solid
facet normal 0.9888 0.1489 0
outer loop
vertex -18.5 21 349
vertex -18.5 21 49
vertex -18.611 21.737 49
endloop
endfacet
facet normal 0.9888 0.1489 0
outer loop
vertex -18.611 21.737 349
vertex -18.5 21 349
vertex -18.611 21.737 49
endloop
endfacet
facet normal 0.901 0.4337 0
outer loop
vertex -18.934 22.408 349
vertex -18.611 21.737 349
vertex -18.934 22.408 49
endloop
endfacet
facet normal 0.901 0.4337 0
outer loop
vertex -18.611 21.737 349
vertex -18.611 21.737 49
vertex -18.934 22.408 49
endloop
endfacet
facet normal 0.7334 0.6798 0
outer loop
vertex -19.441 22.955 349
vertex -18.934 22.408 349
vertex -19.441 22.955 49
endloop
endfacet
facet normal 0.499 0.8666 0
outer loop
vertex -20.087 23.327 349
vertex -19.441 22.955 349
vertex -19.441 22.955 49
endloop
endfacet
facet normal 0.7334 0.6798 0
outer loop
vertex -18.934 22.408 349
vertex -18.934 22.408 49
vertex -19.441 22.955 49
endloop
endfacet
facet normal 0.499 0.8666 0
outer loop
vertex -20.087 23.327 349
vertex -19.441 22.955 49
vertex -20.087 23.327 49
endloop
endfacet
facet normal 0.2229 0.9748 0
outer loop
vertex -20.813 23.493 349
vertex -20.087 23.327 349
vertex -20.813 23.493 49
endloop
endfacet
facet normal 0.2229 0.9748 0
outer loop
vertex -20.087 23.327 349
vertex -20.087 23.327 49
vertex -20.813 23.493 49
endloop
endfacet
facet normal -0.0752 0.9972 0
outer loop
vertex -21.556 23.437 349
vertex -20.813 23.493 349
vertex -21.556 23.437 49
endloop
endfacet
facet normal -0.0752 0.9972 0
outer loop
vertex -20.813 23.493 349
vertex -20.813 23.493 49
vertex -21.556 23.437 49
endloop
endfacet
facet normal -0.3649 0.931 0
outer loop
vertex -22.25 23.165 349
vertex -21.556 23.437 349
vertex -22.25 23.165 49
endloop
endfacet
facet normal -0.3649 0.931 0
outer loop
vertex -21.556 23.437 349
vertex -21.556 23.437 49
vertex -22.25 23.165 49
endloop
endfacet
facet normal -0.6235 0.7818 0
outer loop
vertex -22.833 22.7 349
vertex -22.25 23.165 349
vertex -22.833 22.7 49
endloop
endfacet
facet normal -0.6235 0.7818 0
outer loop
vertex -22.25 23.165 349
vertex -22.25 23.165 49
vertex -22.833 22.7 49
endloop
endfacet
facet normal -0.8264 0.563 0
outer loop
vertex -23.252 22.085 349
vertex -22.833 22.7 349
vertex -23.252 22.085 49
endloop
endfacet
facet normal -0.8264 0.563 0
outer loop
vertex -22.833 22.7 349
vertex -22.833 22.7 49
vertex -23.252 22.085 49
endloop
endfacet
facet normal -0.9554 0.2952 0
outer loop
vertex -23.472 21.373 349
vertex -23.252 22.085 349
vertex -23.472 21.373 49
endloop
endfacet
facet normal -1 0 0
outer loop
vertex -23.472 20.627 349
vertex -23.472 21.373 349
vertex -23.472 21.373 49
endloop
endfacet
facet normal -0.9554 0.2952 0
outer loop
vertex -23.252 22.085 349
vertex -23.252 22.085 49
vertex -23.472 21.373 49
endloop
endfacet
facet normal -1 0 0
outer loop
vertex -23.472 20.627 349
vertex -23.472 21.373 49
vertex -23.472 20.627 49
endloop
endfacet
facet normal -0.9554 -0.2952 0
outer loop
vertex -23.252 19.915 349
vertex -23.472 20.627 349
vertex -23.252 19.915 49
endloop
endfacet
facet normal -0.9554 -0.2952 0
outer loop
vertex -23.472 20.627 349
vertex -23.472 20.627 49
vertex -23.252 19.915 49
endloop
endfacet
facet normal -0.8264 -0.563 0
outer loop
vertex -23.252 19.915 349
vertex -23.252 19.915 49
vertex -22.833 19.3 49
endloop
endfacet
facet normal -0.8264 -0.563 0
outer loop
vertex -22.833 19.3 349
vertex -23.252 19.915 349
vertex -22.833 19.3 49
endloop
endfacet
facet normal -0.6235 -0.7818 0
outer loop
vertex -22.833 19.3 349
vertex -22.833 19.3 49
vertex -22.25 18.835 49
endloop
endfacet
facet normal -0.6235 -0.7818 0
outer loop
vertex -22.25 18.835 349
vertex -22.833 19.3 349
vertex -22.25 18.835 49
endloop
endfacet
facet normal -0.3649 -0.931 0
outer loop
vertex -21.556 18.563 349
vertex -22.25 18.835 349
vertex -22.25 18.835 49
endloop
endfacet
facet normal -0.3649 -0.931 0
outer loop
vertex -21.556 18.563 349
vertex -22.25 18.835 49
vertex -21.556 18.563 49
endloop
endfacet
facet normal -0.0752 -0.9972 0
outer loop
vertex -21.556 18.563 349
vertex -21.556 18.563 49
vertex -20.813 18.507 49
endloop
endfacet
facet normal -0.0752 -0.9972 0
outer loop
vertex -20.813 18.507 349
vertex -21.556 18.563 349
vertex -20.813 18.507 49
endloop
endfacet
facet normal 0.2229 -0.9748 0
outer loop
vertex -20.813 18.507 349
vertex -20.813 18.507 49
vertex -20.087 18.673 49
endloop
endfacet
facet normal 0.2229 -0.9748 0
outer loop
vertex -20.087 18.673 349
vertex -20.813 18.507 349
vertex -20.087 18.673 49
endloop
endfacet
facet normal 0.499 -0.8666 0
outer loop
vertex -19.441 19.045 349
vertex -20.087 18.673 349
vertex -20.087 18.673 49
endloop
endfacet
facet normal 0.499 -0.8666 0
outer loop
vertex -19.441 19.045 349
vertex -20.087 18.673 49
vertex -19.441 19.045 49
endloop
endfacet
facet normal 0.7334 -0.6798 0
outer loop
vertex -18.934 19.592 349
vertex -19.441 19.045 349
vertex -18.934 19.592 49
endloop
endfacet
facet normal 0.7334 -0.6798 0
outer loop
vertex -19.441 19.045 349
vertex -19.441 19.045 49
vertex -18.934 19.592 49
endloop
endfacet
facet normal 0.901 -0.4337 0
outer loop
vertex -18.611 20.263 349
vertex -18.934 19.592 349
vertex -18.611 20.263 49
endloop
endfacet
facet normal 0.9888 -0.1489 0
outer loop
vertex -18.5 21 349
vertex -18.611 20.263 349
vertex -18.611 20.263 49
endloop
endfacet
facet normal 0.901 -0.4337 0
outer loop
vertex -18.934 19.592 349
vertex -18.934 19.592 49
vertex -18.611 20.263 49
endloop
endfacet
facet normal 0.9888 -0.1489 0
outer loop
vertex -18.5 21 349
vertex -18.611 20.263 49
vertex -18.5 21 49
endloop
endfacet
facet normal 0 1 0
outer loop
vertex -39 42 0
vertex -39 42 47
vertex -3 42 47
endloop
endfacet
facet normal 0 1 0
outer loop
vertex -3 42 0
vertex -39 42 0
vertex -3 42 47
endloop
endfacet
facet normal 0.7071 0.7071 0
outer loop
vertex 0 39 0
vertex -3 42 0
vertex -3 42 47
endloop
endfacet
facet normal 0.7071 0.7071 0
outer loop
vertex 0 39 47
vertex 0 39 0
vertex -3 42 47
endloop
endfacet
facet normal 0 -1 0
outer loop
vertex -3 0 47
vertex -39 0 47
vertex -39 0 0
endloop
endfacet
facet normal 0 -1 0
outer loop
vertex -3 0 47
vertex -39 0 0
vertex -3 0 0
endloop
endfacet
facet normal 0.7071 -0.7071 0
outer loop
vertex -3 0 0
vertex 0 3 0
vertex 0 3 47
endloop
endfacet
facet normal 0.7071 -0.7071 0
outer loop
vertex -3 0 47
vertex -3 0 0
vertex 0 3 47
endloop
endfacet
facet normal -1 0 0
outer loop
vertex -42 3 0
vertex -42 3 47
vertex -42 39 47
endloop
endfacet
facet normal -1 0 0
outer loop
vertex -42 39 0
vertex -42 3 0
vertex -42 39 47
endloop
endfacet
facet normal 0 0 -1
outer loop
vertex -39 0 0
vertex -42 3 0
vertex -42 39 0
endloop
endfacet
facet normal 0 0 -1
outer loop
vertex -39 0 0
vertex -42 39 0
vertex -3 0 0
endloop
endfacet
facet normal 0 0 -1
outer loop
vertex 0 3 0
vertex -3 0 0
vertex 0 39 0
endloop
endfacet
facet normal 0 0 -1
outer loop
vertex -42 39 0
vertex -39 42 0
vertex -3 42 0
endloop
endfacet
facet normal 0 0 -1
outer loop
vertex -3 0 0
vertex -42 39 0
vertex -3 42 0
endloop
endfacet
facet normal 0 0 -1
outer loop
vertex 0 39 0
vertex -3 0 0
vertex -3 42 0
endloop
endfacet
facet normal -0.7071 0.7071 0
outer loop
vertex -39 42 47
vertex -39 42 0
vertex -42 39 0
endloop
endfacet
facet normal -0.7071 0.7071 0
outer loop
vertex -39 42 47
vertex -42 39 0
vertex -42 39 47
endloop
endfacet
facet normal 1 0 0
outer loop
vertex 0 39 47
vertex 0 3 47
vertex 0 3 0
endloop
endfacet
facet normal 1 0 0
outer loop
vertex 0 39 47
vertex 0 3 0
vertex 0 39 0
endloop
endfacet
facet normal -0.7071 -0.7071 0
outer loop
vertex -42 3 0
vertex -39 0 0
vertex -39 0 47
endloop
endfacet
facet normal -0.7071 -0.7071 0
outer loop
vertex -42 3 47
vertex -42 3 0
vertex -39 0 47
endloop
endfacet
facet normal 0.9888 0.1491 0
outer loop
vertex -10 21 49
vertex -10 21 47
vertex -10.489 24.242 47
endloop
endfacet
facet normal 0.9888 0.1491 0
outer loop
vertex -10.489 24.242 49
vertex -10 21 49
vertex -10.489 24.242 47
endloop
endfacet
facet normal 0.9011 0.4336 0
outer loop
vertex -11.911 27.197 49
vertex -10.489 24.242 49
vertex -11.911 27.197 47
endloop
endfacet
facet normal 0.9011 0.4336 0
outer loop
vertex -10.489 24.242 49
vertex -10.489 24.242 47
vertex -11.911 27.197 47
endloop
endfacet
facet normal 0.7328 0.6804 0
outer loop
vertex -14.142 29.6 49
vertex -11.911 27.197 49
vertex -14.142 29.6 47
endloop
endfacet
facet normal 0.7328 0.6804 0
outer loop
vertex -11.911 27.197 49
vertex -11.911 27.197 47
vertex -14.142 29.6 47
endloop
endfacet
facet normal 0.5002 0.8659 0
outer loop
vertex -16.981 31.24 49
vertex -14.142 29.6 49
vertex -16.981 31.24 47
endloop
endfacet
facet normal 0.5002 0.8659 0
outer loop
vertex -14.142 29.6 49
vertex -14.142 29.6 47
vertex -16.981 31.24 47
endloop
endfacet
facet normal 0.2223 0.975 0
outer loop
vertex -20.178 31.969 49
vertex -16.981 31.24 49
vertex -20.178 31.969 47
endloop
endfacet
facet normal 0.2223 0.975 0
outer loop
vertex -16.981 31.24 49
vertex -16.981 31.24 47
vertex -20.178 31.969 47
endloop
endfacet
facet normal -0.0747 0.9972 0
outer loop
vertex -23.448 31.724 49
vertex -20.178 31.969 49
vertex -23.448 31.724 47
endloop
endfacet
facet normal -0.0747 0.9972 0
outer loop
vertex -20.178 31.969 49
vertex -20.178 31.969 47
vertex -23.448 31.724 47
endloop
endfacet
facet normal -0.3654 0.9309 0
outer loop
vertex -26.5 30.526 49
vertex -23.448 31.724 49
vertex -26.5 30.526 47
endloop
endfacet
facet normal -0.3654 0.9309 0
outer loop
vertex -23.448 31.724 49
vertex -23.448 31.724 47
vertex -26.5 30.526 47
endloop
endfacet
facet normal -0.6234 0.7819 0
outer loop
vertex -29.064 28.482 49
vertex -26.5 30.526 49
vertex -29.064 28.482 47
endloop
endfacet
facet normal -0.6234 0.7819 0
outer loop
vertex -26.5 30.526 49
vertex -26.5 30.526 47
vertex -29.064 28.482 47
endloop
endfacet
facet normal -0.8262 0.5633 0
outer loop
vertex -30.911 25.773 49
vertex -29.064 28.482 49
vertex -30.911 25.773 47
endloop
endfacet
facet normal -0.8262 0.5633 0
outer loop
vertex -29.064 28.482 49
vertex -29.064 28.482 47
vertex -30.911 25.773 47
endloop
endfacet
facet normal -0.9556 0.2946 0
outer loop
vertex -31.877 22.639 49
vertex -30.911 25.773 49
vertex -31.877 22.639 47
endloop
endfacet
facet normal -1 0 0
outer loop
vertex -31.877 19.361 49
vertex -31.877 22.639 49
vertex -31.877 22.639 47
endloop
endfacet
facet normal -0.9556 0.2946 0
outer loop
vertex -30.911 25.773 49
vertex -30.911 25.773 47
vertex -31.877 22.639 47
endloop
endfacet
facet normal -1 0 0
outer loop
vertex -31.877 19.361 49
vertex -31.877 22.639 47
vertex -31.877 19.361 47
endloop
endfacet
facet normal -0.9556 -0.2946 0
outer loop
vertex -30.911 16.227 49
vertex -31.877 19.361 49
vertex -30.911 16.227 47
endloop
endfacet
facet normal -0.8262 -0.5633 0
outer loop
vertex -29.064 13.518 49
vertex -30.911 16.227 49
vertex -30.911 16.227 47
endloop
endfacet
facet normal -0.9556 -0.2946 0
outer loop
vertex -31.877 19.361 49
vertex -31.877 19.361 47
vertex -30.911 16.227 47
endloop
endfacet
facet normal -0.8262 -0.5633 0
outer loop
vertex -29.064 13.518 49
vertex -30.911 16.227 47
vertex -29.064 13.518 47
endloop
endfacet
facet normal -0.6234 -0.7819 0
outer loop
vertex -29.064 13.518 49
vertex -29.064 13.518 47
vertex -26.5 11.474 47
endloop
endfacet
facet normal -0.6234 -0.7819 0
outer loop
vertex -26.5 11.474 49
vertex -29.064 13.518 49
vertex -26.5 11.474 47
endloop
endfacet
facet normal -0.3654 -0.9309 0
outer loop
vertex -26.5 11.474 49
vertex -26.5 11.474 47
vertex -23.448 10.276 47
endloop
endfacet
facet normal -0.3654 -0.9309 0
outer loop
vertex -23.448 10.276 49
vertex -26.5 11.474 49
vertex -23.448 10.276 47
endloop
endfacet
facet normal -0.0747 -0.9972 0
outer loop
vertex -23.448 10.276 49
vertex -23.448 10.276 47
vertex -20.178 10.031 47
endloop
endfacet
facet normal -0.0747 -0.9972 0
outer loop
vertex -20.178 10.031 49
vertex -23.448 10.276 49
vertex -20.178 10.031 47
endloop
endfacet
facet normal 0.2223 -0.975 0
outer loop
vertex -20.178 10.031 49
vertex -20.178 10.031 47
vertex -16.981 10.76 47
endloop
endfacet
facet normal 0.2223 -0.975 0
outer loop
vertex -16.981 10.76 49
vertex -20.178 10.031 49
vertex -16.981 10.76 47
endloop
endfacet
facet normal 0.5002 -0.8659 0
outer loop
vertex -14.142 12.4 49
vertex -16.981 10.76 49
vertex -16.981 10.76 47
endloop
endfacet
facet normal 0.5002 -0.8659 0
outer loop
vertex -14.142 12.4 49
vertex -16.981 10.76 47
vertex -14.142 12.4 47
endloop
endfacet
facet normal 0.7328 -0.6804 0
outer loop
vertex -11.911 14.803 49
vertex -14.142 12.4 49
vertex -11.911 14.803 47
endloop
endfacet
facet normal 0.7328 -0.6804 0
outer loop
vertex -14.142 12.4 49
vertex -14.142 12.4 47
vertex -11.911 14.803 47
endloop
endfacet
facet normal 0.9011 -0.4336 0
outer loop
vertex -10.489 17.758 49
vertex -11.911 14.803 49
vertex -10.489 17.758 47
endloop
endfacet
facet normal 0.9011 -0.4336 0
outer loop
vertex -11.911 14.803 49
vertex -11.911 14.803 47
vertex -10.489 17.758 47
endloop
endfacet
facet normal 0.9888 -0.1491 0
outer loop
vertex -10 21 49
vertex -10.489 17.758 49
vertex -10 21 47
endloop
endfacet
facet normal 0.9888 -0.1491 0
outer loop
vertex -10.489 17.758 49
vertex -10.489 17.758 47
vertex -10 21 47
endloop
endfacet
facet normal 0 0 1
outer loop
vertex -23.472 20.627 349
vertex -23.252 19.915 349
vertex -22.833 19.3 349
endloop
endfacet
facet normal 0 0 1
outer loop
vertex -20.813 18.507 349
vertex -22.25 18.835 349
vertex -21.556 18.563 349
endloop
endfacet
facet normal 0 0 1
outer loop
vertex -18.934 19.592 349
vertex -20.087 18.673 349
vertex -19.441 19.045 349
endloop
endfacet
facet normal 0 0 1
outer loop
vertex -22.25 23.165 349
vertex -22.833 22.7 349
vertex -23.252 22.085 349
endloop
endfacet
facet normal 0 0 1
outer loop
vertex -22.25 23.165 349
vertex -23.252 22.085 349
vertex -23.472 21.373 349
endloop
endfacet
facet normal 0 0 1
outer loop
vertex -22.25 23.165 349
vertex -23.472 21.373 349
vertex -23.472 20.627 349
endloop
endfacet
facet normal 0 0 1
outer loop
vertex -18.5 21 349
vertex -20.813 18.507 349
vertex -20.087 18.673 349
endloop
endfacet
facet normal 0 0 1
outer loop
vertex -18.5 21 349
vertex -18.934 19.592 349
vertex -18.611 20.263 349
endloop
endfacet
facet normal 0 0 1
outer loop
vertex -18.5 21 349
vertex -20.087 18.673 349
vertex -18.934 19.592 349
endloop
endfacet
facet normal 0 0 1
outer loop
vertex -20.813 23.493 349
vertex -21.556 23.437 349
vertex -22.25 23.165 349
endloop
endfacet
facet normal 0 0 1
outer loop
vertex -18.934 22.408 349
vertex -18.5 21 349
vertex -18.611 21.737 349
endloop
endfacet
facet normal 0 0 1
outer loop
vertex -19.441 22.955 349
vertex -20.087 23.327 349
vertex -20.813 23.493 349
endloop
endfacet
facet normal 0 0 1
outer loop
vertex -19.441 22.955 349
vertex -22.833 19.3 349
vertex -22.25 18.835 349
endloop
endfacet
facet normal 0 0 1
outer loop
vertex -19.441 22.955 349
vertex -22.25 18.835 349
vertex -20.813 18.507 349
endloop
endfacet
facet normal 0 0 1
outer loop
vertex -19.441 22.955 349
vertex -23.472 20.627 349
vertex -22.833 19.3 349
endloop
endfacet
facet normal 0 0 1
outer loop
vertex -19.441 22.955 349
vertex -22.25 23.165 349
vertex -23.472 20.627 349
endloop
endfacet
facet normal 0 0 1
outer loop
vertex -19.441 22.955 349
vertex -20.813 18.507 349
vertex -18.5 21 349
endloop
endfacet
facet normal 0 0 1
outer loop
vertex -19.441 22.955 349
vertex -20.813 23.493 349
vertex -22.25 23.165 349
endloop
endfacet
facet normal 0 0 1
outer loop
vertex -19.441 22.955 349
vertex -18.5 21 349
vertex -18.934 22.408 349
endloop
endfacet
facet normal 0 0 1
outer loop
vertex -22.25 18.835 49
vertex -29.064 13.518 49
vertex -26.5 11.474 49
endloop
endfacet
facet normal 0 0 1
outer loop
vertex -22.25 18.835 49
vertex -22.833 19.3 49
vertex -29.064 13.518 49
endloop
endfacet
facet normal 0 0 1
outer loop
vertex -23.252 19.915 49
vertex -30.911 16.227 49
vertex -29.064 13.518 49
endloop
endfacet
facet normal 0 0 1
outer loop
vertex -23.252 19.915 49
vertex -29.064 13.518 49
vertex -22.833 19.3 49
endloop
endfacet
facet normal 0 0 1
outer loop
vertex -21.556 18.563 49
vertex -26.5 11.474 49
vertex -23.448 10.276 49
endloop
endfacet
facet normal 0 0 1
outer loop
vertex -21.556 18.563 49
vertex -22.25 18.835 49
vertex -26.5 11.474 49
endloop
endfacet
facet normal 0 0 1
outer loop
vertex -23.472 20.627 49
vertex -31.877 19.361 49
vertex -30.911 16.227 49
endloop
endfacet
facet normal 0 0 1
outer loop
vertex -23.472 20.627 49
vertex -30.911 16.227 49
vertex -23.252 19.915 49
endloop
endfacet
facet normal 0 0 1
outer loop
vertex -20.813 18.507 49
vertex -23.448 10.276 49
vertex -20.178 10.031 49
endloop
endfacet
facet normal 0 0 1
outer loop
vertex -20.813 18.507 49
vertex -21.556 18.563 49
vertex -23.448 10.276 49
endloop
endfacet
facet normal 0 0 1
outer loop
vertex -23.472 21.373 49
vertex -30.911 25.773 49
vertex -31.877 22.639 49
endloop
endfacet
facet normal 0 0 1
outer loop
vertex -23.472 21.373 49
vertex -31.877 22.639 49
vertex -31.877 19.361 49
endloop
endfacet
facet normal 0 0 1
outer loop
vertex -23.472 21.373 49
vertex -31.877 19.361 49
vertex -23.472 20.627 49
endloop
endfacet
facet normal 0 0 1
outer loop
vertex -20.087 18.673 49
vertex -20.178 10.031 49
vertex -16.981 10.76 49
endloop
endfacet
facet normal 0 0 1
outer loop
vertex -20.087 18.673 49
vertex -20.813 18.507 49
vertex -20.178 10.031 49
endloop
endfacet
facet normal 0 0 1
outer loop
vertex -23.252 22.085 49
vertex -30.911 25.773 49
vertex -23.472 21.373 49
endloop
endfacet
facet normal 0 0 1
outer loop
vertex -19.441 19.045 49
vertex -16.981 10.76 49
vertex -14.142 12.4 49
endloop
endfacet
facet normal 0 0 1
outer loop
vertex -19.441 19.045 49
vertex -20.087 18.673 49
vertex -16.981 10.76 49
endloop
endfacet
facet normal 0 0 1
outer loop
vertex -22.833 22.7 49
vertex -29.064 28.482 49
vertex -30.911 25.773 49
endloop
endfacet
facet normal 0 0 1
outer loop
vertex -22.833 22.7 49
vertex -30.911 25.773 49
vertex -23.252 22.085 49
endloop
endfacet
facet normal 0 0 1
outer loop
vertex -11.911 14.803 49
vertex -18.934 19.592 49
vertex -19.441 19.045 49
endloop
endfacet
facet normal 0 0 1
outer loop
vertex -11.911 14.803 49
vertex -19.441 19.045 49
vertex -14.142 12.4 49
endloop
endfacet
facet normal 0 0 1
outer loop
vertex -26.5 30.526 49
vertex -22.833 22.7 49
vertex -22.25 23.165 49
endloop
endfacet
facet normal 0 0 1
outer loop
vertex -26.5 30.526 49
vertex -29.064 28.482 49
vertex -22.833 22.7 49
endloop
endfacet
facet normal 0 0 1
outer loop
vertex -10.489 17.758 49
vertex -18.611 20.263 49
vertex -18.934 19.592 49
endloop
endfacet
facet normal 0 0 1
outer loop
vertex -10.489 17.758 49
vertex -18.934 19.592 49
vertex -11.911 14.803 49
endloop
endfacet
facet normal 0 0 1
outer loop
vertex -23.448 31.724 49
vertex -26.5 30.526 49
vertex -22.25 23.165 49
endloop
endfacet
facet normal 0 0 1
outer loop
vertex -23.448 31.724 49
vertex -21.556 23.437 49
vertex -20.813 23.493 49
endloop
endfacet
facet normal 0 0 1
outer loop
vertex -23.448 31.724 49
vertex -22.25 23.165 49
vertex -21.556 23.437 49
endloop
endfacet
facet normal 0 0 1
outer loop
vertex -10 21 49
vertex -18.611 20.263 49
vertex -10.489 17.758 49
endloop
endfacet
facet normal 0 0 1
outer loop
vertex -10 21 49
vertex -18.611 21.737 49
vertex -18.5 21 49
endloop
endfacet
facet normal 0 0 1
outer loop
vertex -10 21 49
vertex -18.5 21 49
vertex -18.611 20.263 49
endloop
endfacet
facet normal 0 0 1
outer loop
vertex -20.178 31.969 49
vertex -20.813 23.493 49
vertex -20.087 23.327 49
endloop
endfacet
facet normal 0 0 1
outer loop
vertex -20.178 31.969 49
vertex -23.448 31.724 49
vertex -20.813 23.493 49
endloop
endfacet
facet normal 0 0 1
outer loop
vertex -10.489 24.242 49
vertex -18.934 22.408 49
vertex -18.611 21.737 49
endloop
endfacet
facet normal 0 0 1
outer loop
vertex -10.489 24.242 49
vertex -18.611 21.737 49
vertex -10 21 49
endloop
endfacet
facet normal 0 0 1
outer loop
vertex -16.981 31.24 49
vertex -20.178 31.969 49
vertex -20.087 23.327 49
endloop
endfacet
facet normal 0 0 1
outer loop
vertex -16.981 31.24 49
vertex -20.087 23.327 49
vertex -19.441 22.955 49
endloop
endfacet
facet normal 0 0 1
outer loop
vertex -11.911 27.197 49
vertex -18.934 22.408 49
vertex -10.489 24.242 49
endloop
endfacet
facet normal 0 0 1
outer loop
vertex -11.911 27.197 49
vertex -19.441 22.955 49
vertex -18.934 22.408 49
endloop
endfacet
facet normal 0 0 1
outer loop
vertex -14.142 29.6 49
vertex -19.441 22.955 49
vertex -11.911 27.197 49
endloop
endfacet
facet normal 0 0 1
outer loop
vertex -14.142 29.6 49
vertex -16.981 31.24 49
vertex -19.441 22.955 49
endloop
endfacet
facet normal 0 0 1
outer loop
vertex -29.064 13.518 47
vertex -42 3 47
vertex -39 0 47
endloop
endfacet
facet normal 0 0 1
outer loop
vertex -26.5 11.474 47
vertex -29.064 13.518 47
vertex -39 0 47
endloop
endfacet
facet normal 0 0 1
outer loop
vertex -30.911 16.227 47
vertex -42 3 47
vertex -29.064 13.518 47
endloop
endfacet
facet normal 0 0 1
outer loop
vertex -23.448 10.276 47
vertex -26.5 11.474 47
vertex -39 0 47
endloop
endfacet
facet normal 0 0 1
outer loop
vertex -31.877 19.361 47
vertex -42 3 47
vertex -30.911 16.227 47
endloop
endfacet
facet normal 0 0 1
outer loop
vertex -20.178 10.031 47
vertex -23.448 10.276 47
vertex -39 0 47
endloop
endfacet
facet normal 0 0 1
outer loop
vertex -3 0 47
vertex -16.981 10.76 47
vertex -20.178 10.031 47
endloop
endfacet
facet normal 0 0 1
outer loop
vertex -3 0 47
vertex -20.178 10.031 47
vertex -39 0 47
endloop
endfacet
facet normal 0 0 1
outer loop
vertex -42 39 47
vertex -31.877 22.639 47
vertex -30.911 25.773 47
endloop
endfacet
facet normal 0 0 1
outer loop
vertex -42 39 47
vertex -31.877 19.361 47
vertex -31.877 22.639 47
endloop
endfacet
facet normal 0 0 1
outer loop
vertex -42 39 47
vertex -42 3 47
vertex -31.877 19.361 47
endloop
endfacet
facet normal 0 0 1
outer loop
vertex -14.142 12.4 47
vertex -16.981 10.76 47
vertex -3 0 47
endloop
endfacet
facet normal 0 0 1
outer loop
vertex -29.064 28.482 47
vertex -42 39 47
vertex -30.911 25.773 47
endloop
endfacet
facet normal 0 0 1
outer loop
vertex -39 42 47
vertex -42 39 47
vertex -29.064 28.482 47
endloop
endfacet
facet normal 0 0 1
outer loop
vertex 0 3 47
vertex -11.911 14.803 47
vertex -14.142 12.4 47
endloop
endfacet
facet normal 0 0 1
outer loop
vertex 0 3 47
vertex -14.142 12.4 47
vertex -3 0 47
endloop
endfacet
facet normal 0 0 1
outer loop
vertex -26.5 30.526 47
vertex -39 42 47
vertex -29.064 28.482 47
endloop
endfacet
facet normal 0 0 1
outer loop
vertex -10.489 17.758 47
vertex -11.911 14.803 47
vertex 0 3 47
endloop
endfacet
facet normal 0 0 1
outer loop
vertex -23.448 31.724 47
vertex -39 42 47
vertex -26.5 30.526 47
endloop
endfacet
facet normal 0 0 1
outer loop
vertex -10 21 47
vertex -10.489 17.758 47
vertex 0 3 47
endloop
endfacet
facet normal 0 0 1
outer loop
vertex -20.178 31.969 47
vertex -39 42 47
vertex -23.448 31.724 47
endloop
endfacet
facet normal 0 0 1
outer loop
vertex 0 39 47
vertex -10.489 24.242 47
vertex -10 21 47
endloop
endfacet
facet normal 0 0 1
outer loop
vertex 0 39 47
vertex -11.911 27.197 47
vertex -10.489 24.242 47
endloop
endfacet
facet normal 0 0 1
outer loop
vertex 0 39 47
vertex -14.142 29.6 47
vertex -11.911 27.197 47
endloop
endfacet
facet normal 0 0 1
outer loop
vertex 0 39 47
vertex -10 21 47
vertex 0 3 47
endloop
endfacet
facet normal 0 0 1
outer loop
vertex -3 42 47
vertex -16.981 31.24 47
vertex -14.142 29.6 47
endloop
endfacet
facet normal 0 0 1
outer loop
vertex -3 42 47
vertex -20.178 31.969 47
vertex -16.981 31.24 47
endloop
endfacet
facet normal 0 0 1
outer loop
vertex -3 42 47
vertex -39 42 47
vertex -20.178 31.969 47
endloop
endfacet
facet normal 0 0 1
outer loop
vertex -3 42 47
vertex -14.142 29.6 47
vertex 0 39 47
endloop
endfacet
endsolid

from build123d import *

# Parameters (mm, degrees)
SKETCH_1_W      = 42
SKETCH_1_H      = 42
EXTRUDE_1_DEPTH = 47
CHAMFER_1_SIZE  = 3
SKETCH_2_R      = 11
EXTRUDE_2_DEPTH = 2
SKETCH_3_R      = 2.5
EXTRUDE_3_DEPTH = 300


with BuildPart() as part:
    # 草图1 → 凸台-拉伸1 (new body)
    with BuildSketch(Plane.XY):
        with Locations((-21, 21)):
            Rectangle(SKETCH_1_W, SKETCH_1_H)
    extrude(amount=EXTRUDE_1_DEPTH)

    # 倒角1
    chamfer_1_edges = [part.edges().sort_by_distance(p)[0] for p in [
        (0, 0, 23.5),
        (-42, 0, 23.5),
        (-42, 42, 23.5),
        (0, 42, 23.5),
    ]]
    chamfer(chamfer_1_edges, length=CHAMFER_1_SIZE)

    # 草图2 → 凸台-拉伸2 (add)
    with BuildSketch(Plane.XY.offset(47)):
        with Locations((-21, 21)):
            Circle(SKETCH_2_R)
    extrude(amount=EXTRUDE_2_DEPTH)

    # 草图3 → 凸台-拉伸3 (add)
    with BuildSketch(Plane.XY.offset(49)):
        with Locations((-21, 21)):
            Circle(SKETCH_3_R)
    extrude(amount=EXTRUDE_3_DEPTH)


solid = part.part
